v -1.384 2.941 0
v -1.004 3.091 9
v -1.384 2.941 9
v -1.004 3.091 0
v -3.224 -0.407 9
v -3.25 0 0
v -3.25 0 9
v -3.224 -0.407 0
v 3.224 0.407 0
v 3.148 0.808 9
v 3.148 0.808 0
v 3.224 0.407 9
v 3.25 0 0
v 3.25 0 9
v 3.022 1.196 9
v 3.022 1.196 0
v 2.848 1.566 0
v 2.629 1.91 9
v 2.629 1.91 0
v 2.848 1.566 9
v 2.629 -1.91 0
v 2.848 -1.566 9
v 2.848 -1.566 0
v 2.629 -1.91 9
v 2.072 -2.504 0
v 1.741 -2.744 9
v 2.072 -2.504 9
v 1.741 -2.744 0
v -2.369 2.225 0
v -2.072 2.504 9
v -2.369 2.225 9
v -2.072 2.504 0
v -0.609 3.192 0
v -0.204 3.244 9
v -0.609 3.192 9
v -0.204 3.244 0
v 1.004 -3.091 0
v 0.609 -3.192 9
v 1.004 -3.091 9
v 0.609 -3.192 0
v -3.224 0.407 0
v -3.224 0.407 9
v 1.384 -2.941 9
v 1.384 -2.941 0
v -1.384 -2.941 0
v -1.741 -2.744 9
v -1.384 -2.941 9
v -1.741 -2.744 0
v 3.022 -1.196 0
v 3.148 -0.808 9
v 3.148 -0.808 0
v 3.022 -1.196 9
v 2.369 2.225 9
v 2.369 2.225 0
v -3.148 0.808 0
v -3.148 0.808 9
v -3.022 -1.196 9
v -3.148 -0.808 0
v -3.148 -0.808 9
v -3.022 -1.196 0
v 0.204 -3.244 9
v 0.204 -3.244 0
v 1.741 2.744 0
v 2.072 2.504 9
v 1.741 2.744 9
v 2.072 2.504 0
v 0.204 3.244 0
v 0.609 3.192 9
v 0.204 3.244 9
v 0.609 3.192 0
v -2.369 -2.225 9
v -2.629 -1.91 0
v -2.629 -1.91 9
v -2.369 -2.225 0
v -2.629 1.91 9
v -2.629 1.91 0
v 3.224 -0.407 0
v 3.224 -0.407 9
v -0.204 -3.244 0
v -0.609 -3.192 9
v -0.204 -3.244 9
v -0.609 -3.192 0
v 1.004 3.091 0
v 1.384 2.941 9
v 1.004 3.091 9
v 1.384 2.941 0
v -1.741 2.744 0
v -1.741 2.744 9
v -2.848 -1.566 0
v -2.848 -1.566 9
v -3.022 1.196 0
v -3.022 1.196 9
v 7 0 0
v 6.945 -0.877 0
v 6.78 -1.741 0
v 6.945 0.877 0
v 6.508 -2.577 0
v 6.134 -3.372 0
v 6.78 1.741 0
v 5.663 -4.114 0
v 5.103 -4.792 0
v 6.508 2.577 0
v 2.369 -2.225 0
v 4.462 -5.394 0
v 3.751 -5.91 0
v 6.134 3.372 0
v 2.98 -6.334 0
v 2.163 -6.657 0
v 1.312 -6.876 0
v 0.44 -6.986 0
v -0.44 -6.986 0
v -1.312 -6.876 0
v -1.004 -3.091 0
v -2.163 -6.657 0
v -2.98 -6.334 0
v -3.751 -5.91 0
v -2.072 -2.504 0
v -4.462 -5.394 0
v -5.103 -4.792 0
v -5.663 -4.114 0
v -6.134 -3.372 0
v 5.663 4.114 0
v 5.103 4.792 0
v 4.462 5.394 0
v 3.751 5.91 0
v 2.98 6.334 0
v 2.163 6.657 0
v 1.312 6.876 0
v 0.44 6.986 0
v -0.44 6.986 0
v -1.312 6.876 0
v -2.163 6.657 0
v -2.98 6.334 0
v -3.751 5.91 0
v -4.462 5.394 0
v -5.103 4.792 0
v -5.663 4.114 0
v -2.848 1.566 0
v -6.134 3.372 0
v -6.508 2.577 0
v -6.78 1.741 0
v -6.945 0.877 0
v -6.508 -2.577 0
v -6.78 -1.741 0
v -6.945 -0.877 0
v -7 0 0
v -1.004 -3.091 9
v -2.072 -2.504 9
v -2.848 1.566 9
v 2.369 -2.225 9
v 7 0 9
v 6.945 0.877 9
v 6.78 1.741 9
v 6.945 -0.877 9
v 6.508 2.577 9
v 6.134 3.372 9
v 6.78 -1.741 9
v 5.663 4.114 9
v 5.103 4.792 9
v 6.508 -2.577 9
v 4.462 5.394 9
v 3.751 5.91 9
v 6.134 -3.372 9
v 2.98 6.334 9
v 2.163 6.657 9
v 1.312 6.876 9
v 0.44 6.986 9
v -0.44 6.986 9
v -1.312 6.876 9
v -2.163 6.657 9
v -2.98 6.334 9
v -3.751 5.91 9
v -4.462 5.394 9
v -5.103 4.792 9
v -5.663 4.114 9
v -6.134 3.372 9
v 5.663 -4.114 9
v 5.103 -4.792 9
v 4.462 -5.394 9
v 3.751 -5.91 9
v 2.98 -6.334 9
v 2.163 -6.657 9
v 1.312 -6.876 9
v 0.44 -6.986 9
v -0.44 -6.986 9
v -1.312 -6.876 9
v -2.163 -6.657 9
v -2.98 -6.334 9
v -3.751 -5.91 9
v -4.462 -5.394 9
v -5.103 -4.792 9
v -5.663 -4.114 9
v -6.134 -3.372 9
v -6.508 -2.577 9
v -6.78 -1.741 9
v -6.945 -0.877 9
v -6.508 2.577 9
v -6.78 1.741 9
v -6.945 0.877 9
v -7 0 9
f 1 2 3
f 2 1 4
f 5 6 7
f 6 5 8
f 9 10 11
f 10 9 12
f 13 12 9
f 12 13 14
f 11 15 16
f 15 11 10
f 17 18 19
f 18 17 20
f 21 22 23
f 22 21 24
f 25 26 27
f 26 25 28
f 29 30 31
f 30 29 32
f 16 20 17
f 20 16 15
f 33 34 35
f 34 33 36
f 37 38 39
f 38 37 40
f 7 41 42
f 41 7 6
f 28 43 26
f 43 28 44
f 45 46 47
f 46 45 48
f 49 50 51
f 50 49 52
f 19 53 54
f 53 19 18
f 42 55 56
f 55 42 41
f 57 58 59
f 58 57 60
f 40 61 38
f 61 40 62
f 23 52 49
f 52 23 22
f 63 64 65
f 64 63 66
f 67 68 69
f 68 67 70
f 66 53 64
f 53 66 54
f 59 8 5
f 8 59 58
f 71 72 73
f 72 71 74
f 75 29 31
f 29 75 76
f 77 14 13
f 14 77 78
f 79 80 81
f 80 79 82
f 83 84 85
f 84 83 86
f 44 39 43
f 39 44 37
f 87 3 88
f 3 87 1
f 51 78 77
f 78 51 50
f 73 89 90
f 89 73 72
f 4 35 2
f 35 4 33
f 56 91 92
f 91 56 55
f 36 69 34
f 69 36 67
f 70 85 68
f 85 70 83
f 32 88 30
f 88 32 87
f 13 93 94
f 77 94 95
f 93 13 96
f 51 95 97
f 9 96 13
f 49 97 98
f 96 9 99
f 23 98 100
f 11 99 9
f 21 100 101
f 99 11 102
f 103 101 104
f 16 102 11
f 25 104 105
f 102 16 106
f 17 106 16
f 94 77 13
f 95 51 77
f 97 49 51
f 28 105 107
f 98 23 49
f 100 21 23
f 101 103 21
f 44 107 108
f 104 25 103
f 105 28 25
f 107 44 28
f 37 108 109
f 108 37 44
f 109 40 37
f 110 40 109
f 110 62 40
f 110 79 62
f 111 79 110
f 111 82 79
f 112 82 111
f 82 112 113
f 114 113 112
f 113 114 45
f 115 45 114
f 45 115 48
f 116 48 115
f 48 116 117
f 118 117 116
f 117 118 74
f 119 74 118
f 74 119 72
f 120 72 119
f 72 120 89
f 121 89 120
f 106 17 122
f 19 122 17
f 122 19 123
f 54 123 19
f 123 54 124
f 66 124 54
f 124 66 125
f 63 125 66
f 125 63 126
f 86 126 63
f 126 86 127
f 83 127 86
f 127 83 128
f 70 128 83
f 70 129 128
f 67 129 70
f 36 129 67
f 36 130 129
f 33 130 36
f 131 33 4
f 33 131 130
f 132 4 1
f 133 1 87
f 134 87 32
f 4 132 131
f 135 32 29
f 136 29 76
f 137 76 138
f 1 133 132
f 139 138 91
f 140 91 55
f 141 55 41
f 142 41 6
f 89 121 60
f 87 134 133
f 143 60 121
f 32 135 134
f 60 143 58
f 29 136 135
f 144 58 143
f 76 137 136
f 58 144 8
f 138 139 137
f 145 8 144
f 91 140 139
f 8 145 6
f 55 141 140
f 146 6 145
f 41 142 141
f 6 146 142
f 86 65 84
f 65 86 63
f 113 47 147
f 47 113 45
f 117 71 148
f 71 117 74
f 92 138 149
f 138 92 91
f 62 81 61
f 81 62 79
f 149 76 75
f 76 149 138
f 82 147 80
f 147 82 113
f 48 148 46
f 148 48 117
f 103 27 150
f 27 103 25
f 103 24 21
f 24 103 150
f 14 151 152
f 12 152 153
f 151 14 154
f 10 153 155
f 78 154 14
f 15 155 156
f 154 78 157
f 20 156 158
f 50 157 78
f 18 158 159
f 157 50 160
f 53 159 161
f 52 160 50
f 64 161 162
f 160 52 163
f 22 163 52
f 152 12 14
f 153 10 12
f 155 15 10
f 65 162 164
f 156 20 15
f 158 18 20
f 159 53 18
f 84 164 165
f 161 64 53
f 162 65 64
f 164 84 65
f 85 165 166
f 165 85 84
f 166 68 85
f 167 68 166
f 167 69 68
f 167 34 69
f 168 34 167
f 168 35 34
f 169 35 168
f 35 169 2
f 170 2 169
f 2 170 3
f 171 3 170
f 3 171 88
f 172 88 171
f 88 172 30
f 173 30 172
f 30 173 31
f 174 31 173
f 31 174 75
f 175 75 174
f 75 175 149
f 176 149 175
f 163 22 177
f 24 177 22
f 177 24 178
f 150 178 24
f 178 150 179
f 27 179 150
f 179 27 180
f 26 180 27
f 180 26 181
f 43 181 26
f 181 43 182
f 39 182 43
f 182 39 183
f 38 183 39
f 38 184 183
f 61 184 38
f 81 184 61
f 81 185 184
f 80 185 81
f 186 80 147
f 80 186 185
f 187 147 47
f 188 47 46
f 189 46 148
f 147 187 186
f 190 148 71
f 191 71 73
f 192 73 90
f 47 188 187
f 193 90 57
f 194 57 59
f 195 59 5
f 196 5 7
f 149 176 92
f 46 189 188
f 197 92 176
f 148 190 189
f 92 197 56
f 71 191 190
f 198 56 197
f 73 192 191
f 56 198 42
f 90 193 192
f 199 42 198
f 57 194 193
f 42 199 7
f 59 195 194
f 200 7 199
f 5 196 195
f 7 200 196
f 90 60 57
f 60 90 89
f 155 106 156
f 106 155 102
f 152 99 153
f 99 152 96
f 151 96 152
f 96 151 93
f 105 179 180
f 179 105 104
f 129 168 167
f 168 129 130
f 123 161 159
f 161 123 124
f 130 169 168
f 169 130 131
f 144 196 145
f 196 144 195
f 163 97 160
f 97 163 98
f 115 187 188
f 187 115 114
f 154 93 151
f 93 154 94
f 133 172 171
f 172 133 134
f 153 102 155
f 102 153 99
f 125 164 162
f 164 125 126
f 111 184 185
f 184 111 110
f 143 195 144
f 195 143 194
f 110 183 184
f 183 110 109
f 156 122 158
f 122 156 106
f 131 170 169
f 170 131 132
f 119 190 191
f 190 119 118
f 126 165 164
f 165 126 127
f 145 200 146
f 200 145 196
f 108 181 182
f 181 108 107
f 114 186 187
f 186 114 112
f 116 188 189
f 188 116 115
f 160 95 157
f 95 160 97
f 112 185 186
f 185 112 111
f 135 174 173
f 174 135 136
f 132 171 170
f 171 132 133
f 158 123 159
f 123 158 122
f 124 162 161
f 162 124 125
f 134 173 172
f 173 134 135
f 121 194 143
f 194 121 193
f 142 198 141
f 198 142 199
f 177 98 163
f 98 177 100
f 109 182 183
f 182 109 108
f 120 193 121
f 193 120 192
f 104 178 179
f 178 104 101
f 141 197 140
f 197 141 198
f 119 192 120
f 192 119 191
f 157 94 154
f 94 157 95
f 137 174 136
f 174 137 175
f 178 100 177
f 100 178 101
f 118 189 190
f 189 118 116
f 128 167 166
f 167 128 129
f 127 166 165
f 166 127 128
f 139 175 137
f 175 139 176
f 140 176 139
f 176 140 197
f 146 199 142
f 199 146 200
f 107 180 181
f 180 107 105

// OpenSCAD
$fn = 50;


difference() {
	union() {
		cylinder(h = 9, r = 7.0000000000);
	}
	union() {
		cylinder(h = 9, r = 3.2500000000);
		cylinder(h = 9, r = 3.2500000000);
		cylinder(h = 9, r = 1.8000000000);
		cylinder(h = 9, r = 1.8000000000);
		cylinder(h = 9, r = 1.8000000000);
		cylinder(h = 9, r = 1.8000000000);
		cylinder(h = 9, r = 1.8000000000);
		cylinder(h = 9, r = 1.8000000000);
	}
}
